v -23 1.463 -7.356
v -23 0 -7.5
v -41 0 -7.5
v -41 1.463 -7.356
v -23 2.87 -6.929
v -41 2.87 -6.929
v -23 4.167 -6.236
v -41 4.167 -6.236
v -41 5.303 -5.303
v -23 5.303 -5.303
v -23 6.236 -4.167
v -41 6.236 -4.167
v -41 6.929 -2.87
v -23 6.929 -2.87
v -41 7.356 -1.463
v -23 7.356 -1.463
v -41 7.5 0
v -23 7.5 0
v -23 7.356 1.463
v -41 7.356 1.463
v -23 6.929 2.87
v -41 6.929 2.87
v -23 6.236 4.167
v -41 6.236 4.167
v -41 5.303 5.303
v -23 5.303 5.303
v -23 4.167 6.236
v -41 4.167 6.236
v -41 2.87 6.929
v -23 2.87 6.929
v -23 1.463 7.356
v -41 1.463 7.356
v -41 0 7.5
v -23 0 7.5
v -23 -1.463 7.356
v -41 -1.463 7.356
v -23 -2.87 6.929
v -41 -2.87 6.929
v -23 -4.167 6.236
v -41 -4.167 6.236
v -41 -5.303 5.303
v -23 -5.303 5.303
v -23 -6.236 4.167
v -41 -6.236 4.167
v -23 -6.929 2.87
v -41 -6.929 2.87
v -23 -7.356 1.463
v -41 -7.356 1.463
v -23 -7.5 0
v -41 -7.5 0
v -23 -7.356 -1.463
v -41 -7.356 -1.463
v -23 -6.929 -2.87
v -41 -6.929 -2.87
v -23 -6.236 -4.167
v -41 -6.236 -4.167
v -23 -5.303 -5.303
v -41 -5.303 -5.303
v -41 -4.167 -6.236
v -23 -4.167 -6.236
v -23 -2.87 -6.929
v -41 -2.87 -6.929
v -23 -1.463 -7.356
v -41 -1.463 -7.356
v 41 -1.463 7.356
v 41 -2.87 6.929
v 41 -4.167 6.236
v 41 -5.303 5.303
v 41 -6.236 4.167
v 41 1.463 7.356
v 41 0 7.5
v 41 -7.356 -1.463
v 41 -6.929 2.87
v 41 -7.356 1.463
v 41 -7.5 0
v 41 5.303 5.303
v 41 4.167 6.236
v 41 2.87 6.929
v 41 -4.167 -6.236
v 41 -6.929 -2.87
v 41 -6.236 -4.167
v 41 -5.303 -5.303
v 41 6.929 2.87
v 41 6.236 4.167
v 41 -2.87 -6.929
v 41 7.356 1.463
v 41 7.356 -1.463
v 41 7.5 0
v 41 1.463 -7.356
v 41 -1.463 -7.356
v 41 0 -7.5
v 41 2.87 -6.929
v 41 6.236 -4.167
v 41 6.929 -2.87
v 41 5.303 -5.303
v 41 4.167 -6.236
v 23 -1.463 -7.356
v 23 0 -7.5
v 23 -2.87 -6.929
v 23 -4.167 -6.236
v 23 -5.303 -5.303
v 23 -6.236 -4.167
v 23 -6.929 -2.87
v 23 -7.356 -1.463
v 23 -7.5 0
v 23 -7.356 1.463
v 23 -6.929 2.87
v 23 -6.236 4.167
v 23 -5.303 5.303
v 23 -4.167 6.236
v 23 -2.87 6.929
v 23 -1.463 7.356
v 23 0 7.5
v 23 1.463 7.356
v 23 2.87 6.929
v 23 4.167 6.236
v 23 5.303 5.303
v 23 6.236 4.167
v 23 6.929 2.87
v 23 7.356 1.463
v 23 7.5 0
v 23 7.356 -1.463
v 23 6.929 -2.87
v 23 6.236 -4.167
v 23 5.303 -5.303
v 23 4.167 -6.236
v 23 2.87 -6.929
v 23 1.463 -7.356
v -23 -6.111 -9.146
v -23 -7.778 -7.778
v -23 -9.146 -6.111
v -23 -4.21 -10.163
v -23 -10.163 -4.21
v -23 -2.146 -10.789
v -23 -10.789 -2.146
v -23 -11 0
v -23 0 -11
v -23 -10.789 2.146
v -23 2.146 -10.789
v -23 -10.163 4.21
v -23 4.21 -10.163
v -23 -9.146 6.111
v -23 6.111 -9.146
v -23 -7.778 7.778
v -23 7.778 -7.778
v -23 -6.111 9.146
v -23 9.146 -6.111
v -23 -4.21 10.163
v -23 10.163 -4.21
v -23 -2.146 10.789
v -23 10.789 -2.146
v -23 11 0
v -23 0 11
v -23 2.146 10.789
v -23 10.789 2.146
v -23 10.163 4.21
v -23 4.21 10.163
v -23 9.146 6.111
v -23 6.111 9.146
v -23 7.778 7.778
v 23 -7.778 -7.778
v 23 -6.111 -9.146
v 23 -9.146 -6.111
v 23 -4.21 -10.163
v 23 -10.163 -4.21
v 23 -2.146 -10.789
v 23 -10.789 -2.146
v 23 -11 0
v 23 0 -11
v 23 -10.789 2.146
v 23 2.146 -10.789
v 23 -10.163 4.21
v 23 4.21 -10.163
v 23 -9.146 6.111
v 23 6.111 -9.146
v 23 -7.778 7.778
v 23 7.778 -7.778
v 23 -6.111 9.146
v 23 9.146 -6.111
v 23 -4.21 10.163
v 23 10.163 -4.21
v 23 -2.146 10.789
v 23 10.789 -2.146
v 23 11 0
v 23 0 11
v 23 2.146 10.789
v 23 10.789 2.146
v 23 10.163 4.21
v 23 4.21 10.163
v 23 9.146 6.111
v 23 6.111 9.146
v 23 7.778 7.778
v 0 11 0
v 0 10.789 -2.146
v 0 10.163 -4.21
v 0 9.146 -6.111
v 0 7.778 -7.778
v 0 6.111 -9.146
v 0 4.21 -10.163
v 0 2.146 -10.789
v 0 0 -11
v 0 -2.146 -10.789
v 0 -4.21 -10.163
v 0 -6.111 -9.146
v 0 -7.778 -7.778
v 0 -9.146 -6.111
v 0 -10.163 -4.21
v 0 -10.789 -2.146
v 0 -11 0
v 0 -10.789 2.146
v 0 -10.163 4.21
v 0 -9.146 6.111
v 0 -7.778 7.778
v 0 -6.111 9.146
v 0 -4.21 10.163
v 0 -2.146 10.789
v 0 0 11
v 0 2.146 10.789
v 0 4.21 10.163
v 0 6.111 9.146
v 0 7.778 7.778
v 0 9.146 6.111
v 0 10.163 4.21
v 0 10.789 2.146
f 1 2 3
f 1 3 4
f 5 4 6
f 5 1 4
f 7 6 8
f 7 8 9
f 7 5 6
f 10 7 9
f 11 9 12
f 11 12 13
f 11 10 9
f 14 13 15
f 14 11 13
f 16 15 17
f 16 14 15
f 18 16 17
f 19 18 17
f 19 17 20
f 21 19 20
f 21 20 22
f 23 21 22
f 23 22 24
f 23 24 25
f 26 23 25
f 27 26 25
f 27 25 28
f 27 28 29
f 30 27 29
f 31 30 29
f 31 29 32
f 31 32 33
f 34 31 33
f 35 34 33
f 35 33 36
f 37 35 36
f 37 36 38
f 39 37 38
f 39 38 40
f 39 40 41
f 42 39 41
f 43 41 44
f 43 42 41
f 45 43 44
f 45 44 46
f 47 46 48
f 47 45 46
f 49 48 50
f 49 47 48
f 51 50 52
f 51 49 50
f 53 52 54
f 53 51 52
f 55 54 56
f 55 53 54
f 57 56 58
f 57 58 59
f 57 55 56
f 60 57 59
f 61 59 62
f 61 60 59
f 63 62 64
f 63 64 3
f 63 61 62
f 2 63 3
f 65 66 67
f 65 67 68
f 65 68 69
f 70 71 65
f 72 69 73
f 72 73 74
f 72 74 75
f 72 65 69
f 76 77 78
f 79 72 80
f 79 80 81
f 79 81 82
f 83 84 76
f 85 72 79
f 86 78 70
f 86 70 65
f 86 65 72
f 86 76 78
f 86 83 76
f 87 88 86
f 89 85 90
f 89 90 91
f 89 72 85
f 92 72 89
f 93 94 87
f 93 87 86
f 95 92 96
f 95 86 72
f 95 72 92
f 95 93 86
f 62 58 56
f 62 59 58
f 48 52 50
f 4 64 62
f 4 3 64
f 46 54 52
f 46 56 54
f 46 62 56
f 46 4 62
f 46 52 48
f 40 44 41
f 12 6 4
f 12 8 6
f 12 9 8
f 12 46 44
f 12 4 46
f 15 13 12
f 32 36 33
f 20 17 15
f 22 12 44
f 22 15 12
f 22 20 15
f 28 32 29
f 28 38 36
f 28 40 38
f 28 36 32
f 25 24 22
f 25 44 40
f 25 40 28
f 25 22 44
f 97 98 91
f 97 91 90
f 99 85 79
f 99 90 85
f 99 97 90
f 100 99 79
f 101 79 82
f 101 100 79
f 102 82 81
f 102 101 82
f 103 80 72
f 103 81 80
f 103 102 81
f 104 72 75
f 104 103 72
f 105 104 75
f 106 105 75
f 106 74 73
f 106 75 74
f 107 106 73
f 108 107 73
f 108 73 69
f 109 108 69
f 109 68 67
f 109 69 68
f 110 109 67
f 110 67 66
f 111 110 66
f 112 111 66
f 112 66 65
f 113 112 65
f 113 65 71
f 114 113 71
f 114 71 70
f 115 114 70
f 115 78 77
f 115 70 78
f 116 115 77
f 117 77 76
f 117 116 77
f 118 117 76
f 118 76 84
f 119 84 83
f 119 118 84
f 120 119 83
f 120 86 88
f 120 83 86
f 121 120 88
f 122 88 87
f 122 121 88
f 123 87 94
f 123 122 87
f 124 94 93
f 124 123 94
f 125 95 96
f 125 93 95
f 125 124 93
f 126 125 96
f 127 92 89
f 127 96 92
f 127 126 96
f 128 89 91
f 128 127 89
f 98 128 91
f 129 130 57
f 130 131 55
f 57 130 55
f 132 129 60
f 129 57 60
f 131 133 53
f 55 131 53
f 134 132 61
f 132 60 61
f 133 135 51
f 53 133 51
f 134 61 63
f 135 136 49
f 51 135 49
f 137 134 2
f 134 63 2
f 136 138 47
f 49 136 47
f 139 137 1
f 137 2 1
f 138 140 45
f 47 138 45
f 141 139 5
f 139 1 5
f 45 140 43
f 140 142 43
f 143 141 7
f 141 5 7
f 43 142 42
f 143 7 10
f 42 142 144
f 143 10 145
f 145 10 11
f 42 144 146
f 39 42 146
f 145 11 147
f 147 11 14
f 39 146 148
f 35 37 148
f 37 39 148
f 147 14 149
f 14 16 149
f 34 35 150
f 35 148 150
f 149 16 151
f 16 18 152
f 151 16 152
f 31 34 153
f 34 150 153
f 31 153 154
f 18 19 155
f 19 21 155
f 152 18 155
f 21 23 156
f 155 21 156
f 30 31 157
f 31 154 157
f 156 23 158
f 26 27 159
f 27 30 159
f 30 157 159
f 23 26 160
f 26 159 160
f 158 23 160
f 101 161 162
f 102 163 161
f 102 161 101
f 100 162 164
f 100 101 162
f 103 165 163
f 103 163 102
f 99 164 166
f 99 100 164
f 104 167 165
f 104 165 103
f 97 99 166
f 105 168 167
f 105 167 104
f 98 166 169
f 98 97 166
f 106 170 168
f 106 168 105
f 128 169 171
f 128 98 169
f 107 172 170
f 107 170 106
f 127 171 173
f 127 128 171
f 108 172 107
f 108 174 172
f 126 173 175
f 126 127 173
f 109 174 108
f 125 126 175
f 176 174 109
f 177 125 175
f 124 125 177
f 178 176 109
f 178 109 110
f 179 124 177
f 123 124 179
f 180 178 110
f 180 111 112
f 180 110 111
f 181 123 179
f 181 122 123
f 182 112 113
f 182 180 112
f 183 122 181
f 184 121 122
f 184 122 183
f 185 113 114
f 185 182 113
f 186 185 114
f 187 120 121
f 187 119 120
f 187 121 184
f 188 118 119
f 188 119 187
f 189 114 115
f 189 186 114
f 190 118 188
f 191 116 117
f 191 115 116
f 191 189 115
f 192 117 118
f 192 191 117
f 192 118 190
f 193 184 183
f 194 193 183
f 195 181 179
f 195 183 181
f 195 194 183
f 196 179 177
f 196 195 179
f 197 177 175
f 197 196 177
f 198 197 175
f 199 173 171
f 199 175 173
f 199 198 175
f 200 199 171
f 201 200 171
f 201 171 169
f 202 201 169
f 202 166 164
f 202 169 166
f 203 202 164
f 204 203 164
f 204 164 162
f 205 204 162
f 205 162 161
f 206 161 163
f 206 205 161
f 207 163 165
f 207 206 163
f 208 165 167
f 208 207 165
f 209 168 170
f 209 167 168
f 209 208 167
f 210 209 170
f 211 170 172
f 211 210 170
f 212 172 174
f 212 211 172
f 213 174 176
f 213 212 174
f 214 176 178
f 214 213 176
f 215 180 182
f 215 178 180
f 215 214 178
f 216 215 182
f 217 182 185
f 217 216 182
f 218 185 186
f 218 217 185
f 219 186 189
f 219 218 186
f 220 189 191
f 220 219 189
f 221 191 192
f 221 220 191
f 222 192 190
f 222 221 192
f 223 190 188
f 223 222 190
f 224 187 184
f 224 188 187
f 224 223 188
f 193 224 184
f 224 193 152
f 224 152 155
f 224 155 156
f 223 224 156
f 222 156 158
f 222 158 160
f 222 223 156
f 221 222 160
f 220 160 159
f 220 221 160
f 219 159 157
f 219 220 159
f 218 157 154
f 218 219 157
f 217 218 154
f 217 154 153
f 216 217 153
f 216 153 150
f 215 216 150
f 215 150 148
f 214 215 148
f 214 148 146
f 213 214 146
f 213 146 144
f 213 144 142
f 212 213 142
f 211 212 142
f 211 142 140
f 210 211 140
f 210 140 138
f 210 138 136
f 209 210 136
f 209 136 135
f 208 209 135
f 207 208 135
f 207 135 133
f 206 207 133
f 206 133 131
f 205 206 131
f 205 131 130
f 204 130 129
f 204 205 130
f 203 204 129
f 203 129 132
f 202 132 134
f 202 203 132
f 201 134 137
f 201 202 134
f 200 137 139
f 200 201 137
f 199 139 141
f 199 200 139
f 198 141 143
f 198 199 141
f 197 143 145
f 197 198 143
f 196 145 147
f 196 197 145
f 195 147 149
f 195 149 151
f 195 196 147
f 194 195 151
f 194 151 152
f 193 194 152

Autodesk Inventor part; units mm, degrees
ref_plane "XZ Plane" through (0, 0, 0) normal (0, 1, 0) x (-1, 0, 0)
ref_plane "XY Plane" through (0, 0, 0) normal (0, 0, 1) x (1, 0, 0)
sketch "Sketch1" plane through (0, 0, 0) normal (1, 0, 0) x (0, 1, 0)
  circle A0 centre (0, 0) radius 11
  dimension "d0" = 22
extrude "Extrusion1" add sketch "Sketch1" along normal mid plane 46
sketch "Sketch3" plane through (23, 0, 0) normal (1, 0, 0) x (0, 0, -1)
  circle A0 centre (0, 0) radius 7.5
  dimension "d3" = 15
extrude "Extrusion2" add sketch "Sketch3" along normal blind 18
thread "Thread1" size "M15x1.5" class "6g" standard "ISO Metric profile" length 13
ref_plane "Work Plane1" through (0, 0, 0) normal (1, 0, 0) x (0, 1, 0)
mirror "Mirror2" about plane through (0, 0, 0) normal (1, 0, 0) of "Extrusion2"
properties part number "5. PlateSpacers" material "Silicon Nitride"
